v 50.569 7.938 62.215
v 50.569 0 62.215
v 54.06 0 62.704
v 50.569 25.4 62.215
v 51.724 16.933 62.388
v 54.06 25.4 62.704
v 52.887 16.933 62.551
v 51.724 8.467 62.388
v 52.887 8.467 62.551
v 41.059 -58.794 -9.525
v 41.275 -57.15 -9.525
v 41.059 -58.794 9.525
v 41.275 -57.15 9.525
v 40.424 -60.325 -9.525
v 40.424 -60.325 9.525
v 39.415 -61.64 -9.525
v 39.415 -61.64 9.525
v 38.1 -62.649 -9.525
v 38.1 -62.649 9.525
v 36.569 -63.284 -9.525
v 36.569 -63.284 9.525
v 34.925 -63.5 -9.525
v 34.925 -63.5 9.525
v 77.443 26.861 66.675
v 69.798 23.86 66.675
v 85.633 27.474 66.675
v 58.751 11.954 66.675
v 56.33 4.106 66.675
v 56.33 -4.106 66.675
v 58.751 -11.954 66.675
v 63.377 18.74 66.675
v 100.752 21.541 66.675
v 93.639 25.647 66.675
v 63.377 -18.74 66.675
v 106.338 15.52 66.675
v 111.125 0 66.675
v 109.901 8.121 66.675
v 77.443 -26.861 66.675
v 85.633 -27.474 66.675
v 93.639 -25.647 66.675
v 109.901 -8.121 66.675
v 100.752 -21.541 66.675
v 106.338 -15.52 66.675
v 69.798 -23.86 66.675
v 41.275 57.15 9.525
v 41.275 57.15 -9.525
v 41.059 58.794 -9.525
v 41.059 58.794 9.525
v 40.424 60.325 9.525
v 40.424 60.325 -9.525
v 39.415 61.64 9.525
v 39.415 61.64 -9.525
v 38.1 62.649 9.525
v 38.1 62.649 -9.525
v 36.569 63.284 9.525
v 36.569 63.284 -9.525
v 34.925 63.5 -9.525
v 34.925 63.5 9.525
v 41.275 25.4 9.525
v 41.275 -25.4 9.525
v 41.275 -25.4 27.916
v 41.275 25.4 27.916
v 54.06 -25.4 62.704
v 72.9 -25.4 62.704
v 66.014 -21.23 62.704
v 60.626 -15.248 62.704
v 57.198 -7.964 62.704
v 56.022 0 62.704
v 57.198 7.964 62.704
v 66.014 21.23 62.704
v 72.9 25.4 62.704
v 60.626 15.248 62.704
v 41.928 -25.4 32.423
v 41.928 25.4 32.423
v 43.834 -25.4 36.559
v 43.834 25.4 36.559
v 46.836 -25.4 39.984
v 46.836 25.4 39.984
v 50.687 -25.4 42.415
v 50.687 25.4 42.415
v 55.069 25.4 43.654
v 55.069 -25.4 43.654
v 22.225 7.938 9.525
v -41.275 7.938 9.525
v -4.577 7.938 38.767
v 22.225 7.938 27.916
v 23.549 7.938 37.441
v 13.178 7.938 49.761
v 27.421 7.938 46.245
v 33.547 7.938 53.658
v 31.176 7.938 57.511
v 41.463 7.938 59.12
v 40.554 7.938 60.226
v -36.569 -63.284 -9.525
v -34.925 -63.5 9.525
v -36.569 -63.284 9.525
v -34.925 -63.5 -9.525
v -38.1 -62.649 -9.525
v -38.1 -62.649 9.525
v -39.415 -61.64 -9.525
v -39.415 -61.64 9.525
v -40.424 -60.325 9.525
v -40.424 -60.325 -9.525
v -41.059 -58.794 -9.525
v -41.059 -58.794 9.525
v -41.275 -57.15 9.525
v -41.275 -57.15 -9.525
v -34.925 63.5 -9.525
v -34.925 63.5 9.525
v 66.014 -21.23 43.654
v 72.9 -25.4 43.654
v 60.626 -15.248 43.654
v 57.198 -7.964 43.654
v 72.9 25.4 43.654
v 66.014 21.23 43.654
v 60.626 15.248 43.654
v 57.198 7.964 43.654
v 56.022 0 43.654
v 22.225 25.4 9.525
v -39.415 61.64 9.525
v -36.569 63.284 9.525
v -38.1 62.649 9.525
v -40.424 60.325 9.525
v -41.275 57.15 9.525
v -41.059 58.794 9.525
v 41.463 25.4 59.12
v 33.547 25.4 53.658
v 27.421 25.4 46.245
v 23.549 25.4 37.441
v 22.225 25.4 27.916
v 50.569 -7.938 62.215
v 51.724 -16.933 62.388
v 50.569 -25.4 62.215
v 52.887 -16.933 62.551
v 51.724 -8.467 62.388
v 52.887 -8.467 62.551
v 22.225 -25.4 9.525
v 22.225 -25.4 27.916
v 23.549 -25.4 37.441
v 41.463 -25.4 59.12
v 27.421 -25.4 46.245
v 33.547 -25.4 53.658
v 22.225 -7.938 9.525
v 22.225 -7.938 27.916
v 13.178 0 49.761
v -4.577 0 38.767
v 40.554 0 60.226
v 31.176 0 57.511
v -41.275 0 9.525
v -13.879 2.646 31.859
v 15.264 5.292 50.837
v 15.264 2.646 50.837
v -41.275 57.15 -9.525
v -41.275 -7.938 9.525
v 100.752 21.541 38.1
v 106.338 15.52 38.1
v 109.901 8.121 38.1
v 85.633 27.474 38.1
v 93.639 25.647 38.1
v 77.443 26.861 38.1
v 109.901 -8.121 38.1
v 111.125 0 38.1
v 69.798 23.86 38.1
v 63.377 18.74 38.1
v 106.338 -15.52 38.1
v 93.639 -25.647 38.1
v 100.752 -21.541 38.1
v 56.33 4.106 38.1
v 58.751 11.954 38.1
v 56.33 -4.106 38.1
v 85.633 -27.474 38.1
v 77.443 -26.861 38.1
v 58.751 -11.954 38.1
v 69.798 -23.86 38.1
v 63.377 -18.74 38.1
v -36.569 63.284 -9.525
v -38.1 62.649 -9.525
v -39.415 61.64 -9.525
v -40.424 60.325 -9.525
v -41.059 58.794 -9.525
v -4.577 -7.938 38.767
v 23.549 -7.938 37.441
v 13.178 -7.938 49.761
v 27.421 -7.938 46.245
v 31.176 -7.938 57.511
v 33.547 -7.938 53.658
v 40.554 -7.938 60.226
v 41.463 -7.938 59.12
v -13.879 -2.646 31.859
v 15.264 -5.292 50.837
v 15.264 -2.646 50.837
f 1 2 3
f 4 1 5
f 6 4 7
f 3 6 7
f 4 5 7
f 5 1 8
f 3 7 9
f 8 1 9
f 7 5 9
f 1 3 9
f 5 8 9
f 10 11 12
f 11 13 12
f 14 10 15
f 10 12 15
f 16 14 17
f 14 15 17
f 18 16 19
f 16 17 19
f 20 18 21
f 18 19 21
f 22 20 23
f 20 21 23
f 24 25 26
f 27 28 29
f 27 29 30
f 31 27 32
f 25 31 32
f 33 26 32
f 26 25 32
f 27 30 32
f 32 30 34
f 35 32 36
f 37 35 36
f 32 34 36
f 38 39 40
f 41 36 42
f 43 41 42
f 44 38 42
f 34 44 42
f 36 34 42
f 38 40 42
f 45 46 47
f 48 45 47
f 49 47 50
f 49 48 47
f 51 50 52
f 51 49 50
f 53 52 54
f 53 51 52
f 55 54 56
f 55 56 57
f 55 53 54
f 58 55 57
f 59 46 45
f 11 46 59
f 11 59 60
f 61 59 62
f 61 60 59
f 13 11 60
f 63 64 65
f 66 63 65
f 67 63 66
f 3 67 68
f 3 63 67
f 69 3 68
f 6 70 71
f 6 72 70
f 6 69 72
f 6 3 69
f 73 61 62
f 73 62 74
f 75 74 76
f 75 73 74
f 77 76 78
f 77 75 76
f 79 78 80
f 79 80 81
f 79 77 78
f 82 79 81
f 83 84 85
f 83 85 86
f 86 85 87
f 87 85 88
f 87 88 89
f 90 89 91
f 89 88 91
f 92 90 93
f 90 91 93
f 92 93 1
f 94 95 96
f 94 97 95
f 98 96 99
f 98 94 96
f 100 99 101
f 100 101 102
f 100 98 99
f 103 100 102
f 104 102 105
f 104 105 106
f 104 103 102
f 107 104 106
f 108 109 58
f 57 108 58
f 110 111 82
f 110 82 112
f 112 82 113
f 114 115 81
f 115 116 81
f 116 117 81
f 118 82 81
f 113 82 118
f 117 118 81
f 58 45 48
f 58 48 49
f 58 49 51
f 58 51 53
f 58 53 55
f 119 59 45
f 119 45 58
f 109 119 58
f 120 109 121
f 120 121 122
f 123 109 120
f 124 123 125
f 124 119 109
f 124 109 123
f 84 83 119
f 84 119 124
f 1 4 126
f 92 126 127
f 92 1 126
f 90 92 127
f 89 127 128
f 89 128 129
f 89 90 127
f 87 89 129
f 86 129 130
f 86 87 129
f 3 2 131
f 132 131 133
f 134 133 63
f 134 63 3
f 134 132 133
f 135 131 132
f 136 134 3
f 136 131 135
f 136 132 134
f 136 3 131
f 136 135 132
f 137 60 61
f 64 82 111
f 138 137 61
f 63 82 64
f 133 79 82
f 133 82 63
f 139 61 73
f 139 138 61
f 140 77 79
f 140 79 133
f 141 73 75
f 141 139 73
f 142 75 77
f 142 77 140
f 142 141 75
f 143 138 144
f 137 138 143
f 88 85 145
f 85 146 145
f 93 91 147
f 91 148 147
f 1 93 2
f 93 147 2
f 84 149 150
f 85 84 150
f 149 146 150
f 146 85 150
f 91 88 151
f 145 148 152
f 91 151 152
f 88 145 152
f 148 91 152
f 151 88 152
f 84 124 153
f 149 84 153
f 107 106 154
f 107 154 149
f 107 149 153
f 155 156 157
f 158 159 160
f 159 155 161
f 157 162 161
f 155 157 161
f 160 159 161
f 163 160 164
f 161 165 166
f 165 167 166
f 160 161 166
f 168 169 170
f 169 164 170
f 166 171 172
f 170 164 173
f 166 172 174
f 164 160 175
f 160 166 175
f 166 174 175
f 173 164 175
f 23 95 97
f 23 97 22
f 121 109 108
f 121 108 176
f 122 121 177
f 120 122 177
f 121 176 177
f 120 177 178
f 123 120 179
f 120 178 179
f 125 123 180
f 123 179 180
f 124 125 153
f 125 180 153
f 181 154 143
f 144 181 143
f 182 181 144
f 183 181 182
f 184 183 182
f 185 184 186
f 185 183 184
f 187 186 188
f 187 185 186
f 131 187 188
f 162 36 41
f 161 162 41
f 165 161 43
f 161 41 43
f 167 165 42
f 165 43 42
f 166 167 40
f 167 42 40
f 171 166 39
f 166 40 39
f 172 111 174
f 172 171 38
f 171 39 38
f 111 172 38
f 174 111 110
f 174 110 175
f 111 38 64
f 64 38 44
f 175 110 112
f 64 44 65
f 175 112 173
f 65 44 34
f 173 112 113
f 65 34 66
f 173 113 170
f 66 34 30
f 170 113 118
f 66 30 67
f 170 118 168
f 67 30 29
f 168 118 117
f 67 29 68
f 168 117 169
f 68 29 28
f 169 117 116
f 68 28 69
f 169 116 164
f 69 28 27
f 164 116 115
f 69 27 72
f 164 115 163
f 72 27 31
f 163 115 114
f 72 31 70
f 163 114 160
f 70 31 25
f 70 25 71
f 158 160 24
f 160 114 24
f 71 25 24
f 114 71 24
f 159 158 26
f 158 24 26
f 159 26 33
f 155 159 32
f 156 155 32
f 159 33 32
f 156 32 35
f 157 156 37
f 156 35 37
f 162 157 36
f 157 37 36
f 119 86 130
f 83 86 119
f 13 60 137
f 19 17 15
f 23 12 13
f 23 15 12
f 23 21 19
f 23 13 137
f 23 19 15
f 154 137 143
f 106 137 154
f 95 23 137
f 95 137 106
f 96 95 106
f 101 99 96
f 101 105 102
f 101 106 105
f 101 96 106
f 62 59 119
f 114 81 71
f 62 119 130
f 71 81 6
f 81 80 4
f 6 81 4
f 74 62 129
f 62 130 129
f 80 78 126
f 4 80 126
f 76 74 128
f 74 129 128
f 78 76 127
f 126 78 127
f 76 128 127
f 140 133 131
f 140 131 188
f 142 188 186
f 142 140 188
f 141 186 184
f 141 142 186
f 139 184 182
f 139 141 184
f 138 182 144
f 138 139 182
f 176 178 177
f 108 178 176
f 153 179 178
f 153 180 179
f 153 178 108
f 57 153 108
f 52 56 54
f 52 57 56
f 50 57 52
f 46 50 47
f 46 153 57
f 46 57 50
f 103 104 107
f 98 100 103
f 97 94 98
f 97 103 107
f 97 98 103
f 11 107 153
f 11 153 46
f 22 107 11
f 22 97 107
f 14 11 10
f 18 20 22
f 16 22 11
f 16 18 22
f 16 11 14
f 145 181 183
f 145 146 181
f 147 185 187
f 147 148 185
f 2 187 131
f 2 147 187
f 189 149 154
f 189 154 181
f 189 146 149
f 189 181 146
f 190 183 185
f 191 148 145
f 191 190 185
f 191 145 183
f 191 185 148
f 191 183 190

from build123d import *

# Parameters (mm, degrees)
F1_DEPTH  = 63.5
F2_DEPTH  = 25.4
F3_DEPTH  = 7.9375
F2_FACE_W = 50.8
F2_FACE_H = 19.05
F4_DEPTH  = 12.7
F6_R      = 6.35


with BuildPart() as f1:
    # F0 (on Front) → F1 (new body, symmetric)
    with BuildSketch(Plane.XZ):
        Polygon((41.275, -9.525), (41.275, 9.525), (22.225, 9.525), (-41.275, 9.525), (-41.275, -9.525), align=None)
    extrude(amount=F1_DEPTH, both=True)

    # F0 (on Front) → F2 (join, symmetric)
    with BuildSketch(Plane.XZ):
        with BuildLine():
            Line((22.225, 9.525), (41.275, 9.525))
            Line((41.275, 9.525), (41.275, 27.915647))
            ThreePointArc((41.275, 27.915647), (45.211633, 38.379443), (55.069144, 43.653679))
            Line((55.069144, 43.653679), (60.325, 43.653679))
            Line((60.325, 43.653679), (60.325, 62.703679))
            Line((60.325, 62.703679), (54.059947, 62.703679))
            add(Edge.make_bspline(
                [(50.568891, 62.214986), (51.7192, 62.392836), (52.882727, 62.555887), (54.059947, 62.703679)],
                knots=[106.101689, 106.101689, 106.101689, 106.101689, 109.163749, 109.163749, 109.163749, 109.163749], degree=3))
            ThreePointArc((50.568891, 62.214986), (30.227882, 50.163236), (22.225, 27.915647))
            Line((22.225, 27.915647), (22.225, 9.525))
        make_face()
    extrude(amount=F2_DEPTH, both=True)

    # F0 (on Front) → F3 (join, symmetric)
    with BuildSketch(Plane.XZ):
        with BuildLine():
            Line((-41.275, 9.525), (22.225, 9.525))
            Line((22.225, 9.525), (22.225, 27.915647))
            ThreePointArc((22.225, 27.915647), (30.227882, 50.163236), (50.568891, 62.214986))
            add(Edge.make_bspline(
                [(-41.275, 9.525), (-13.280101, 32.121023), (10.710167, 56.052397), (50.568891, 62.214986)],
                knots=[0, 0, 0, 0, 106.101689, 106.101689, 106.101689, 106.101689], degree=3))
        make_face()
    extrude(amount=F3_DEPTH, both=True)

    # F2_face (on face) → F4 (join)
    with BuildSketch(Plane(origin=(60.325, 0, 53.178679), x_dir=(0, 1, 0), z_dir=(1, 0, 0))):
        Rectangle(F2_FACE_W, F2_FACE_H)
    extrude(amount=F4_DEPTH)

    # F0 (on Front) → F5 (revolve)
    with BuildSketch(Plane.XZ):
        Polygon((83.573606, 62.703679), (83.573606, 43.653679), (83.573606, 38.1), (111.125, 38.1), (111.125, 66.675), (83.573606, 66.675), align=None)
    revolve(axis=Axis((83.573606, 0, 40.87684), (0, 0, -1)))

    # F6
    f6_edges = [f1.edges().sort_by_distance(p)[0] for p in [
        (-41.275, -63.5, 0),
        (41.275, -63.5, 0),
        (41.275, 63.5, 0),
        (-41.275, 63.5, 0),
    ]]
    fillet(f6_edges, radius=F6_R)


solid = f1.part
